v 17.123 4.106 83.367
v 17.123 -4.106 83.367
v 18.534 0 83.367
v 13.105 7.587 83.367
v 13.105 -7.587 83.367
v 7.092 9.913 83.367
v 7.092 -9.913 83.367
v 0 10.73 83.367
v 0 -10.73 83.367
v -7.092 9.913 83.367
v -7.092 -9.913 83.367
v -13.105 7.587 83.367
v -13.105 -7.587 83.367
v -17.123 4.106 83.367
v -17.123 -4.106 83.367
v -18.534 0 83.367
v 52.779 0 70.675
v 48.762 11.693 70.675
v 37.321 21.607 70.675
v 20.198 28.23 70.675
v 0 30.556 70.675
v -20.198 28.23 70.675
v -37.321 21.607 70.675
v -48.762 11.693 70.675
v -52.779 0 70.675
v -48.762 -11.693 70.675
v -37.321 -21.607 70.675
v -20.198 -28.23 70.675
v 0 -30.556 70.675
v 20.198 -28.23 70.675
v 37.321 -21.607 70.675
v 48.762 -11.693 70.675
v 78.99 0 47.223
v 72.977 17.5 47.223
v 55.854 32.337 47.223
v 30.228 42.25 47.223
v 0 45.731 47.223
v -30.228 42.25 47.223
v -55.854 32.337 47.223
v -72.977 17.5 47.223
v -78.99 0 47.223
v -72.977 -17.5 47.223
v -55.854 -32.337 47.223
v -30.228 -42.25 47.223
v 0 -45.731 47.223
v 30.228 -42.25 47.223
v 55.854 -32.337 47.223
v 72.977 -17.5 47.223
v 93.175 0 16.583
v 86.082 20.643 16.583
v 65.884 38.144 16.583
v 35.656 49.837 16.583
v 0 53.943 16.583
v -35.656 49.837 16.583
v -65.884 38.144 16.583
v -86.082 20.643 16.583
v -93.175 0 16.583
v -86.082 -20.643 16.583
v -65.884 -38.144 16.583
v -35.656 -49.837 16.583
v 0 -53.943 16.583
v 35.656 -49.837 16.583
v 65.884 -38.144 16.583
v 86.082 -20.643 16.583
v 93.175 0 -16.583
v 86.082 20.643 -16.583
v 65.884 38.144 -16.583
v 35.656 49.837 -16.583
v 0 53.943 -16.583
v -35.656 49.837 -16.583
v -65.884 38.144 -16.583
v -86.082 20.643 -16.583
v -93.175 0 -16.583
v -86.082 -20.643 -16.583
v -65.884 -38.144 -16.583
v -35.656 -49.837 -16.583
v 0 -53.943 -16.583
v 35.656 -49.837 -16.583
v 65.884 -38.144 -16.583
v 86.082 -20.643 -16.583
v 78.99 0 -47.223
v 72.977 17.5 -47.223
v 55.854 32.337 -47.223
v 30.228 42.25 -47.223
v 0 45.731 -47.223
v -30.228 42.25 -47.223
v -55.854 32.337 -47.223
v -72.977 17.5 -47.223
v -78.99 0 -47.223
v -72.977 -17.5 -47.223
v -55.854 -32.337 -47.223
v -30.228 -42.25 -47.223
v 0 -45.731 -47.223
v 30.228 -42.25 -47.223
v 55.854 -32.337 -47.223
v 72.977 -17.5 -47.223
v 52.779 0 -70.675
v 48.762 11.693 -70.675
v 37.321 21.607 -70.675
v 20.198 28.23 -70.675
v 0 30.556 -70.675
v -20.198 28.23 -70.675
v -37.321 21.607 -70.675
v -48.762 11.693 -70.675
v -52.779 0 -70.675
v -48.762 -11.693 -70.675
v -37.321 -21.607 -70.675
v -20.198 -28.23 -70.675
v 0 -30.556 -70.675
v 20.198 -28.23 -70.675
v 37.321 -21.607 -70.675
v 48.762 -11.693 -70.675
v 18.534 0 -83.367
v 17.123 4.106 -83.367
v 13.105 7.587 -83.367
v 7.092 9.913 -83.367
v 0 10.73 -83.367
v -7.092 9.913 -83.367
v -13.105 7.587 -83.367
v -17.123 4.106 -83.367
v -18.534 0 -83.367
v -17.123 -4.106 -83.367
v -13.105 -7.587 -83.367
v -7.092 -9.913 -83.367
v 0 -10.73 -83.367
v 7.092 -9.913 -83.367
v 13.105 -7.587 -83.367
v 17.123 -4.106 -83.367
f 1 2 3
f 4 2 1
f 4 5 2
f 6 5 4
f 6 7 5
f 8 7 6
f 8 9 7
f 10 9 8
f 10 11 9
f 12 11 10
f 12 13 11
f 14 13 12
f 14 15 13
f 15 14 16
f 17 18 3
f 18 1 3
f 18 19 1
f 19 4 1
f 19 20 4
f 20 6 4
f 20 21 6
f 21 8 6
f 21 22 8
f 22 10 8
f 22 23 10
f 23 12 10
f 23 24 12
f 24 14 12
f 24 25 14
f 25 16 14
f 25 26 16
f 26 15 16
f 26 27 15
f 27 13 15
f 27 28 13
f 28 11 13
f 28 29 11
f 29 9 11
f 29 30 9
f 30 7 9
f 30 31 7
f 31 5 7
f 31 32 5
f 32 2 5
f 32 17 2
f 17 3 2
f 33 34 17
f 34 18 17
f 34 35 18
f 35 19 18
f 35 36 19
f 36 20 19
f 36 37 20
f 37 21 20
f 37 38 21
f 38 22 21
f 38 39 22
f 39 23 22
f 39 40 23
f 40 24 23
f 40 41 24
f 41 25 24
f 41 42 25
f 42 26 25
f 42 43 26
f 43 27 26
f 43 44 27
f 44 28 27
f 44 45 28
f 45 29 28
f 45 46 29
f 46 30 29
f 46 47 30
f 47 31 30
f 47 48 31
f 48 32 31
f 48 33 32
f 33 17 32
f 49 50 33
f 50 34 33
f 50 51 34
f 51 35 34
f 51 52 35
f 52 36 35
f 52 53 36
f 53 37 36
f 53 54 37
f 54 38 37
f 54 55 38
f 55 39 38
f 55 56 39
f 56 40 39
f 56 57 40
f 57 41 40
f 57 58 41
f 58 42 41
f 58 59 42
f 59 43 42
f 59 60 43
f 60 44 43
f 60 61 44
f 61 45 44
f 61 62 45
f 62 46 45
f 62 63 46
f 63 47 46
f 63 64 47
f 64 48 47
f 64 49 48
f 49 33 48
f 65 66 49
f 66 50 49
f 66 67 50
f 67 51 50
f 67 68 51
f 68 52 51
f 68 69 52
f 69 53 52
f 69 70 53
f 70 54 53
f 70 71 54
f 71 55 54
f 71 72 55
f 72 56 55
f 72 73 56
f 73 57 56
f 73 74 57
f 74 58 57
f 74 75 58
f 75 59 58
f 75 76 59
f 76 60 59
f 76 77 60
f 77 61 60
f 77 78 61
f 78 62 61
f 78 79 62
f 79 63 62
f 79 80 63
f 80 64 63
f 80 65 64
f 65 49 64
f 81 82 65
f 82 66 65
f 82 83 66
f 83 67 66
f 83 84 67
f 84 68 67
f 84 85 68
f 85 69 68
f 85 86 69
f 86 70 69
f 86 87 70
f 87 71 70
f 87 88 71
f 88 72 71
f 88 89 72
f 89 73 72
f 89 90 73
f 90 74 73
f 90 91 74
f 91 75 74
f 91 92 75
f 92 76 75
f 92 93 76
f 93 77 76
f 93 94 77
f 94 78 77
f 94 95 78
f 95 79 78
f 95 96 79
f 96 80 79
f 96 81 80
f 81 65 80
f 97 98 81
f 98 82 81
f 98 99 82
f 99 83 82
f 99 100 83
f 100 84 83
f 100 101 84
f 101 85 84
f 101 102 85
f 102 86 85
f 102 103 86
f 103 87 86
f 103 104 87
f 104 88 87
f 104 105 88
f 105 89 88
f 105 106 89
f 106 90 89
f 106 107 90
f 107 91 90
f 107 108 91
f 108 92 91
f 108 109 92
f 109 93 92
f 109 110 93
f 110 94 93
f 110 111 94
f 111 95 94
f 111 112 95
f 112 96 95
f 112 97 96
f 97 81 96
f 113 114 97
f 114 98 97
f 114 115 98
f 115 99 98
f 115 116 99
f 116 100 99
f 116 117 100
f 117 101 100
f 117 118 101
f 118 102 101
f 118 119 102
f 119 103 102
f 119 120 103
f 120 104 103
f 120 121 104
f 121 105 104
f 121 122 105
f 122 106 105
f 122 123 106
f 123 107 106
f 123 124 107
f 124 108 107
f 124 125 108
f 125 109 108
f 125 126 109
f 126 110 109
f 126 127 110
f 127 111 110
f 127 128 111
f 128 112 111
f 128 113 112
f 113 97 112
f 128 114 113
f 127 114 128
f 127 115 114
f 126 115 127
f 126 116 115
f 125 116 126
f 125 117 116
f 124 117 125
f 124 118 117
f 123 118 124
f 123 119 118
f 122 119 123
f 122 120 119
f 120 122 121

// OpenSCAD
// Generated by SolidPython 1.0.1 on 2020-07-29 00:46:54


scale(v = [19, 11, 17]) {
	sphere(r = 5);
}
/***********************************************
*********      SolidPython code:      **********
************************************************
 
# import packages: SolidPython
from solid import *
from solid.utils import *
from itertools import chain, combinations, permutations


class Resize:

    def __init__(self, scad_file):
        self.scad_file = scad_file
        #self.scad_file = import_scad(scad_file)
        # cone/cylinder param:
        self.r1 = 0
        self.r2 = 0
        self.h = 0
        # rectangular prism param:
        self.w = 0
        self.l = 0
        # ellipse param:
        self.r = 0

    # import OpenScad code (file name corresponds to shape)


    # classify shape + parameters
    def assign(self, param1, param2, param3):
        if self.scad_file == 'cone.scad':
            self.r1 = param1
            self.r2 = param2
            self.h = param3
        elif self.scad_file == 'cylinder.scad':
            self.r1 = param1
            self.r2 = param2
            self.h = param3
        elif self.scad_file == 'rectangularPrism.scad':
            self.h = param1
            self.l = param2
            self.w = param3
        else:
            self.r = param1
            self.h = param2

    # resize parameters
    def iterate(self):
        x = range(3, 20, 2)
        i = 1
        if self.scad_file == 'cone.scad':
            tempList = list(permutations(x, 2))
            for temp in tempList:
                param1 = temp[0]
                param2 = temp[1]
                filepath = 'produced_scad_files/' + 'cone' + str(param1) + '_' + str(param2) + '_' + '.scad'
                scad_render_to_file(cylinder(h=param1, r1=param2, r2=0), filepath)

        elif self.scad_file == 'cylinder.scad':
            tempList = list(permutations(x, 3))
            for temp in tempList:
                param1 = temp[0]
                param2 = temp[1]
                filepath = 'produced_scad_files/' + 'cylinder' + str(param1) + '_' + str(param2) + '_' + '.scad'
                scad_render_to_file(cylinder(h=param1, r1=param2, r2=param2), filepath)

        elif self.scad_file == 'rectangularPrism.scad':
            tempList = list(permutations(x, 3))
            for temp in tempList:
                param1 = temp[0]
                param2 = temp[1]
                param3 = temp[2]
                filepath = 'produced_scad_files/' + 'rectangularPrism' + str(param1) + '_' + str(param2) + '_' + str(
                    param3) + '.scad'
                scad_render_to_file(cube(size=(param1, param2, param3)), filepath)

        elif self.scad_file == 'ellipse.scad':
            tempList = list(permutations(x, 4))
            for temp in tempList:
                param1 = temp[0]
                param2 = temp[1]
                param3 = temp[2]
                param4 = temp[3]
                filepath = 'produced_scad_files/' + 'ellipse' + str(param1) + '_' + str(param2) + '_' + str(param3) + '_' + str(param4) + '.scad'
                scad_render_to_file(scale([param1, param2, param3])(sphere(r=param4)), filepath)

    def render_to_scadfile(self):
        scad_render_to_file(scad, 'example.scad') 
 
************************************************/
